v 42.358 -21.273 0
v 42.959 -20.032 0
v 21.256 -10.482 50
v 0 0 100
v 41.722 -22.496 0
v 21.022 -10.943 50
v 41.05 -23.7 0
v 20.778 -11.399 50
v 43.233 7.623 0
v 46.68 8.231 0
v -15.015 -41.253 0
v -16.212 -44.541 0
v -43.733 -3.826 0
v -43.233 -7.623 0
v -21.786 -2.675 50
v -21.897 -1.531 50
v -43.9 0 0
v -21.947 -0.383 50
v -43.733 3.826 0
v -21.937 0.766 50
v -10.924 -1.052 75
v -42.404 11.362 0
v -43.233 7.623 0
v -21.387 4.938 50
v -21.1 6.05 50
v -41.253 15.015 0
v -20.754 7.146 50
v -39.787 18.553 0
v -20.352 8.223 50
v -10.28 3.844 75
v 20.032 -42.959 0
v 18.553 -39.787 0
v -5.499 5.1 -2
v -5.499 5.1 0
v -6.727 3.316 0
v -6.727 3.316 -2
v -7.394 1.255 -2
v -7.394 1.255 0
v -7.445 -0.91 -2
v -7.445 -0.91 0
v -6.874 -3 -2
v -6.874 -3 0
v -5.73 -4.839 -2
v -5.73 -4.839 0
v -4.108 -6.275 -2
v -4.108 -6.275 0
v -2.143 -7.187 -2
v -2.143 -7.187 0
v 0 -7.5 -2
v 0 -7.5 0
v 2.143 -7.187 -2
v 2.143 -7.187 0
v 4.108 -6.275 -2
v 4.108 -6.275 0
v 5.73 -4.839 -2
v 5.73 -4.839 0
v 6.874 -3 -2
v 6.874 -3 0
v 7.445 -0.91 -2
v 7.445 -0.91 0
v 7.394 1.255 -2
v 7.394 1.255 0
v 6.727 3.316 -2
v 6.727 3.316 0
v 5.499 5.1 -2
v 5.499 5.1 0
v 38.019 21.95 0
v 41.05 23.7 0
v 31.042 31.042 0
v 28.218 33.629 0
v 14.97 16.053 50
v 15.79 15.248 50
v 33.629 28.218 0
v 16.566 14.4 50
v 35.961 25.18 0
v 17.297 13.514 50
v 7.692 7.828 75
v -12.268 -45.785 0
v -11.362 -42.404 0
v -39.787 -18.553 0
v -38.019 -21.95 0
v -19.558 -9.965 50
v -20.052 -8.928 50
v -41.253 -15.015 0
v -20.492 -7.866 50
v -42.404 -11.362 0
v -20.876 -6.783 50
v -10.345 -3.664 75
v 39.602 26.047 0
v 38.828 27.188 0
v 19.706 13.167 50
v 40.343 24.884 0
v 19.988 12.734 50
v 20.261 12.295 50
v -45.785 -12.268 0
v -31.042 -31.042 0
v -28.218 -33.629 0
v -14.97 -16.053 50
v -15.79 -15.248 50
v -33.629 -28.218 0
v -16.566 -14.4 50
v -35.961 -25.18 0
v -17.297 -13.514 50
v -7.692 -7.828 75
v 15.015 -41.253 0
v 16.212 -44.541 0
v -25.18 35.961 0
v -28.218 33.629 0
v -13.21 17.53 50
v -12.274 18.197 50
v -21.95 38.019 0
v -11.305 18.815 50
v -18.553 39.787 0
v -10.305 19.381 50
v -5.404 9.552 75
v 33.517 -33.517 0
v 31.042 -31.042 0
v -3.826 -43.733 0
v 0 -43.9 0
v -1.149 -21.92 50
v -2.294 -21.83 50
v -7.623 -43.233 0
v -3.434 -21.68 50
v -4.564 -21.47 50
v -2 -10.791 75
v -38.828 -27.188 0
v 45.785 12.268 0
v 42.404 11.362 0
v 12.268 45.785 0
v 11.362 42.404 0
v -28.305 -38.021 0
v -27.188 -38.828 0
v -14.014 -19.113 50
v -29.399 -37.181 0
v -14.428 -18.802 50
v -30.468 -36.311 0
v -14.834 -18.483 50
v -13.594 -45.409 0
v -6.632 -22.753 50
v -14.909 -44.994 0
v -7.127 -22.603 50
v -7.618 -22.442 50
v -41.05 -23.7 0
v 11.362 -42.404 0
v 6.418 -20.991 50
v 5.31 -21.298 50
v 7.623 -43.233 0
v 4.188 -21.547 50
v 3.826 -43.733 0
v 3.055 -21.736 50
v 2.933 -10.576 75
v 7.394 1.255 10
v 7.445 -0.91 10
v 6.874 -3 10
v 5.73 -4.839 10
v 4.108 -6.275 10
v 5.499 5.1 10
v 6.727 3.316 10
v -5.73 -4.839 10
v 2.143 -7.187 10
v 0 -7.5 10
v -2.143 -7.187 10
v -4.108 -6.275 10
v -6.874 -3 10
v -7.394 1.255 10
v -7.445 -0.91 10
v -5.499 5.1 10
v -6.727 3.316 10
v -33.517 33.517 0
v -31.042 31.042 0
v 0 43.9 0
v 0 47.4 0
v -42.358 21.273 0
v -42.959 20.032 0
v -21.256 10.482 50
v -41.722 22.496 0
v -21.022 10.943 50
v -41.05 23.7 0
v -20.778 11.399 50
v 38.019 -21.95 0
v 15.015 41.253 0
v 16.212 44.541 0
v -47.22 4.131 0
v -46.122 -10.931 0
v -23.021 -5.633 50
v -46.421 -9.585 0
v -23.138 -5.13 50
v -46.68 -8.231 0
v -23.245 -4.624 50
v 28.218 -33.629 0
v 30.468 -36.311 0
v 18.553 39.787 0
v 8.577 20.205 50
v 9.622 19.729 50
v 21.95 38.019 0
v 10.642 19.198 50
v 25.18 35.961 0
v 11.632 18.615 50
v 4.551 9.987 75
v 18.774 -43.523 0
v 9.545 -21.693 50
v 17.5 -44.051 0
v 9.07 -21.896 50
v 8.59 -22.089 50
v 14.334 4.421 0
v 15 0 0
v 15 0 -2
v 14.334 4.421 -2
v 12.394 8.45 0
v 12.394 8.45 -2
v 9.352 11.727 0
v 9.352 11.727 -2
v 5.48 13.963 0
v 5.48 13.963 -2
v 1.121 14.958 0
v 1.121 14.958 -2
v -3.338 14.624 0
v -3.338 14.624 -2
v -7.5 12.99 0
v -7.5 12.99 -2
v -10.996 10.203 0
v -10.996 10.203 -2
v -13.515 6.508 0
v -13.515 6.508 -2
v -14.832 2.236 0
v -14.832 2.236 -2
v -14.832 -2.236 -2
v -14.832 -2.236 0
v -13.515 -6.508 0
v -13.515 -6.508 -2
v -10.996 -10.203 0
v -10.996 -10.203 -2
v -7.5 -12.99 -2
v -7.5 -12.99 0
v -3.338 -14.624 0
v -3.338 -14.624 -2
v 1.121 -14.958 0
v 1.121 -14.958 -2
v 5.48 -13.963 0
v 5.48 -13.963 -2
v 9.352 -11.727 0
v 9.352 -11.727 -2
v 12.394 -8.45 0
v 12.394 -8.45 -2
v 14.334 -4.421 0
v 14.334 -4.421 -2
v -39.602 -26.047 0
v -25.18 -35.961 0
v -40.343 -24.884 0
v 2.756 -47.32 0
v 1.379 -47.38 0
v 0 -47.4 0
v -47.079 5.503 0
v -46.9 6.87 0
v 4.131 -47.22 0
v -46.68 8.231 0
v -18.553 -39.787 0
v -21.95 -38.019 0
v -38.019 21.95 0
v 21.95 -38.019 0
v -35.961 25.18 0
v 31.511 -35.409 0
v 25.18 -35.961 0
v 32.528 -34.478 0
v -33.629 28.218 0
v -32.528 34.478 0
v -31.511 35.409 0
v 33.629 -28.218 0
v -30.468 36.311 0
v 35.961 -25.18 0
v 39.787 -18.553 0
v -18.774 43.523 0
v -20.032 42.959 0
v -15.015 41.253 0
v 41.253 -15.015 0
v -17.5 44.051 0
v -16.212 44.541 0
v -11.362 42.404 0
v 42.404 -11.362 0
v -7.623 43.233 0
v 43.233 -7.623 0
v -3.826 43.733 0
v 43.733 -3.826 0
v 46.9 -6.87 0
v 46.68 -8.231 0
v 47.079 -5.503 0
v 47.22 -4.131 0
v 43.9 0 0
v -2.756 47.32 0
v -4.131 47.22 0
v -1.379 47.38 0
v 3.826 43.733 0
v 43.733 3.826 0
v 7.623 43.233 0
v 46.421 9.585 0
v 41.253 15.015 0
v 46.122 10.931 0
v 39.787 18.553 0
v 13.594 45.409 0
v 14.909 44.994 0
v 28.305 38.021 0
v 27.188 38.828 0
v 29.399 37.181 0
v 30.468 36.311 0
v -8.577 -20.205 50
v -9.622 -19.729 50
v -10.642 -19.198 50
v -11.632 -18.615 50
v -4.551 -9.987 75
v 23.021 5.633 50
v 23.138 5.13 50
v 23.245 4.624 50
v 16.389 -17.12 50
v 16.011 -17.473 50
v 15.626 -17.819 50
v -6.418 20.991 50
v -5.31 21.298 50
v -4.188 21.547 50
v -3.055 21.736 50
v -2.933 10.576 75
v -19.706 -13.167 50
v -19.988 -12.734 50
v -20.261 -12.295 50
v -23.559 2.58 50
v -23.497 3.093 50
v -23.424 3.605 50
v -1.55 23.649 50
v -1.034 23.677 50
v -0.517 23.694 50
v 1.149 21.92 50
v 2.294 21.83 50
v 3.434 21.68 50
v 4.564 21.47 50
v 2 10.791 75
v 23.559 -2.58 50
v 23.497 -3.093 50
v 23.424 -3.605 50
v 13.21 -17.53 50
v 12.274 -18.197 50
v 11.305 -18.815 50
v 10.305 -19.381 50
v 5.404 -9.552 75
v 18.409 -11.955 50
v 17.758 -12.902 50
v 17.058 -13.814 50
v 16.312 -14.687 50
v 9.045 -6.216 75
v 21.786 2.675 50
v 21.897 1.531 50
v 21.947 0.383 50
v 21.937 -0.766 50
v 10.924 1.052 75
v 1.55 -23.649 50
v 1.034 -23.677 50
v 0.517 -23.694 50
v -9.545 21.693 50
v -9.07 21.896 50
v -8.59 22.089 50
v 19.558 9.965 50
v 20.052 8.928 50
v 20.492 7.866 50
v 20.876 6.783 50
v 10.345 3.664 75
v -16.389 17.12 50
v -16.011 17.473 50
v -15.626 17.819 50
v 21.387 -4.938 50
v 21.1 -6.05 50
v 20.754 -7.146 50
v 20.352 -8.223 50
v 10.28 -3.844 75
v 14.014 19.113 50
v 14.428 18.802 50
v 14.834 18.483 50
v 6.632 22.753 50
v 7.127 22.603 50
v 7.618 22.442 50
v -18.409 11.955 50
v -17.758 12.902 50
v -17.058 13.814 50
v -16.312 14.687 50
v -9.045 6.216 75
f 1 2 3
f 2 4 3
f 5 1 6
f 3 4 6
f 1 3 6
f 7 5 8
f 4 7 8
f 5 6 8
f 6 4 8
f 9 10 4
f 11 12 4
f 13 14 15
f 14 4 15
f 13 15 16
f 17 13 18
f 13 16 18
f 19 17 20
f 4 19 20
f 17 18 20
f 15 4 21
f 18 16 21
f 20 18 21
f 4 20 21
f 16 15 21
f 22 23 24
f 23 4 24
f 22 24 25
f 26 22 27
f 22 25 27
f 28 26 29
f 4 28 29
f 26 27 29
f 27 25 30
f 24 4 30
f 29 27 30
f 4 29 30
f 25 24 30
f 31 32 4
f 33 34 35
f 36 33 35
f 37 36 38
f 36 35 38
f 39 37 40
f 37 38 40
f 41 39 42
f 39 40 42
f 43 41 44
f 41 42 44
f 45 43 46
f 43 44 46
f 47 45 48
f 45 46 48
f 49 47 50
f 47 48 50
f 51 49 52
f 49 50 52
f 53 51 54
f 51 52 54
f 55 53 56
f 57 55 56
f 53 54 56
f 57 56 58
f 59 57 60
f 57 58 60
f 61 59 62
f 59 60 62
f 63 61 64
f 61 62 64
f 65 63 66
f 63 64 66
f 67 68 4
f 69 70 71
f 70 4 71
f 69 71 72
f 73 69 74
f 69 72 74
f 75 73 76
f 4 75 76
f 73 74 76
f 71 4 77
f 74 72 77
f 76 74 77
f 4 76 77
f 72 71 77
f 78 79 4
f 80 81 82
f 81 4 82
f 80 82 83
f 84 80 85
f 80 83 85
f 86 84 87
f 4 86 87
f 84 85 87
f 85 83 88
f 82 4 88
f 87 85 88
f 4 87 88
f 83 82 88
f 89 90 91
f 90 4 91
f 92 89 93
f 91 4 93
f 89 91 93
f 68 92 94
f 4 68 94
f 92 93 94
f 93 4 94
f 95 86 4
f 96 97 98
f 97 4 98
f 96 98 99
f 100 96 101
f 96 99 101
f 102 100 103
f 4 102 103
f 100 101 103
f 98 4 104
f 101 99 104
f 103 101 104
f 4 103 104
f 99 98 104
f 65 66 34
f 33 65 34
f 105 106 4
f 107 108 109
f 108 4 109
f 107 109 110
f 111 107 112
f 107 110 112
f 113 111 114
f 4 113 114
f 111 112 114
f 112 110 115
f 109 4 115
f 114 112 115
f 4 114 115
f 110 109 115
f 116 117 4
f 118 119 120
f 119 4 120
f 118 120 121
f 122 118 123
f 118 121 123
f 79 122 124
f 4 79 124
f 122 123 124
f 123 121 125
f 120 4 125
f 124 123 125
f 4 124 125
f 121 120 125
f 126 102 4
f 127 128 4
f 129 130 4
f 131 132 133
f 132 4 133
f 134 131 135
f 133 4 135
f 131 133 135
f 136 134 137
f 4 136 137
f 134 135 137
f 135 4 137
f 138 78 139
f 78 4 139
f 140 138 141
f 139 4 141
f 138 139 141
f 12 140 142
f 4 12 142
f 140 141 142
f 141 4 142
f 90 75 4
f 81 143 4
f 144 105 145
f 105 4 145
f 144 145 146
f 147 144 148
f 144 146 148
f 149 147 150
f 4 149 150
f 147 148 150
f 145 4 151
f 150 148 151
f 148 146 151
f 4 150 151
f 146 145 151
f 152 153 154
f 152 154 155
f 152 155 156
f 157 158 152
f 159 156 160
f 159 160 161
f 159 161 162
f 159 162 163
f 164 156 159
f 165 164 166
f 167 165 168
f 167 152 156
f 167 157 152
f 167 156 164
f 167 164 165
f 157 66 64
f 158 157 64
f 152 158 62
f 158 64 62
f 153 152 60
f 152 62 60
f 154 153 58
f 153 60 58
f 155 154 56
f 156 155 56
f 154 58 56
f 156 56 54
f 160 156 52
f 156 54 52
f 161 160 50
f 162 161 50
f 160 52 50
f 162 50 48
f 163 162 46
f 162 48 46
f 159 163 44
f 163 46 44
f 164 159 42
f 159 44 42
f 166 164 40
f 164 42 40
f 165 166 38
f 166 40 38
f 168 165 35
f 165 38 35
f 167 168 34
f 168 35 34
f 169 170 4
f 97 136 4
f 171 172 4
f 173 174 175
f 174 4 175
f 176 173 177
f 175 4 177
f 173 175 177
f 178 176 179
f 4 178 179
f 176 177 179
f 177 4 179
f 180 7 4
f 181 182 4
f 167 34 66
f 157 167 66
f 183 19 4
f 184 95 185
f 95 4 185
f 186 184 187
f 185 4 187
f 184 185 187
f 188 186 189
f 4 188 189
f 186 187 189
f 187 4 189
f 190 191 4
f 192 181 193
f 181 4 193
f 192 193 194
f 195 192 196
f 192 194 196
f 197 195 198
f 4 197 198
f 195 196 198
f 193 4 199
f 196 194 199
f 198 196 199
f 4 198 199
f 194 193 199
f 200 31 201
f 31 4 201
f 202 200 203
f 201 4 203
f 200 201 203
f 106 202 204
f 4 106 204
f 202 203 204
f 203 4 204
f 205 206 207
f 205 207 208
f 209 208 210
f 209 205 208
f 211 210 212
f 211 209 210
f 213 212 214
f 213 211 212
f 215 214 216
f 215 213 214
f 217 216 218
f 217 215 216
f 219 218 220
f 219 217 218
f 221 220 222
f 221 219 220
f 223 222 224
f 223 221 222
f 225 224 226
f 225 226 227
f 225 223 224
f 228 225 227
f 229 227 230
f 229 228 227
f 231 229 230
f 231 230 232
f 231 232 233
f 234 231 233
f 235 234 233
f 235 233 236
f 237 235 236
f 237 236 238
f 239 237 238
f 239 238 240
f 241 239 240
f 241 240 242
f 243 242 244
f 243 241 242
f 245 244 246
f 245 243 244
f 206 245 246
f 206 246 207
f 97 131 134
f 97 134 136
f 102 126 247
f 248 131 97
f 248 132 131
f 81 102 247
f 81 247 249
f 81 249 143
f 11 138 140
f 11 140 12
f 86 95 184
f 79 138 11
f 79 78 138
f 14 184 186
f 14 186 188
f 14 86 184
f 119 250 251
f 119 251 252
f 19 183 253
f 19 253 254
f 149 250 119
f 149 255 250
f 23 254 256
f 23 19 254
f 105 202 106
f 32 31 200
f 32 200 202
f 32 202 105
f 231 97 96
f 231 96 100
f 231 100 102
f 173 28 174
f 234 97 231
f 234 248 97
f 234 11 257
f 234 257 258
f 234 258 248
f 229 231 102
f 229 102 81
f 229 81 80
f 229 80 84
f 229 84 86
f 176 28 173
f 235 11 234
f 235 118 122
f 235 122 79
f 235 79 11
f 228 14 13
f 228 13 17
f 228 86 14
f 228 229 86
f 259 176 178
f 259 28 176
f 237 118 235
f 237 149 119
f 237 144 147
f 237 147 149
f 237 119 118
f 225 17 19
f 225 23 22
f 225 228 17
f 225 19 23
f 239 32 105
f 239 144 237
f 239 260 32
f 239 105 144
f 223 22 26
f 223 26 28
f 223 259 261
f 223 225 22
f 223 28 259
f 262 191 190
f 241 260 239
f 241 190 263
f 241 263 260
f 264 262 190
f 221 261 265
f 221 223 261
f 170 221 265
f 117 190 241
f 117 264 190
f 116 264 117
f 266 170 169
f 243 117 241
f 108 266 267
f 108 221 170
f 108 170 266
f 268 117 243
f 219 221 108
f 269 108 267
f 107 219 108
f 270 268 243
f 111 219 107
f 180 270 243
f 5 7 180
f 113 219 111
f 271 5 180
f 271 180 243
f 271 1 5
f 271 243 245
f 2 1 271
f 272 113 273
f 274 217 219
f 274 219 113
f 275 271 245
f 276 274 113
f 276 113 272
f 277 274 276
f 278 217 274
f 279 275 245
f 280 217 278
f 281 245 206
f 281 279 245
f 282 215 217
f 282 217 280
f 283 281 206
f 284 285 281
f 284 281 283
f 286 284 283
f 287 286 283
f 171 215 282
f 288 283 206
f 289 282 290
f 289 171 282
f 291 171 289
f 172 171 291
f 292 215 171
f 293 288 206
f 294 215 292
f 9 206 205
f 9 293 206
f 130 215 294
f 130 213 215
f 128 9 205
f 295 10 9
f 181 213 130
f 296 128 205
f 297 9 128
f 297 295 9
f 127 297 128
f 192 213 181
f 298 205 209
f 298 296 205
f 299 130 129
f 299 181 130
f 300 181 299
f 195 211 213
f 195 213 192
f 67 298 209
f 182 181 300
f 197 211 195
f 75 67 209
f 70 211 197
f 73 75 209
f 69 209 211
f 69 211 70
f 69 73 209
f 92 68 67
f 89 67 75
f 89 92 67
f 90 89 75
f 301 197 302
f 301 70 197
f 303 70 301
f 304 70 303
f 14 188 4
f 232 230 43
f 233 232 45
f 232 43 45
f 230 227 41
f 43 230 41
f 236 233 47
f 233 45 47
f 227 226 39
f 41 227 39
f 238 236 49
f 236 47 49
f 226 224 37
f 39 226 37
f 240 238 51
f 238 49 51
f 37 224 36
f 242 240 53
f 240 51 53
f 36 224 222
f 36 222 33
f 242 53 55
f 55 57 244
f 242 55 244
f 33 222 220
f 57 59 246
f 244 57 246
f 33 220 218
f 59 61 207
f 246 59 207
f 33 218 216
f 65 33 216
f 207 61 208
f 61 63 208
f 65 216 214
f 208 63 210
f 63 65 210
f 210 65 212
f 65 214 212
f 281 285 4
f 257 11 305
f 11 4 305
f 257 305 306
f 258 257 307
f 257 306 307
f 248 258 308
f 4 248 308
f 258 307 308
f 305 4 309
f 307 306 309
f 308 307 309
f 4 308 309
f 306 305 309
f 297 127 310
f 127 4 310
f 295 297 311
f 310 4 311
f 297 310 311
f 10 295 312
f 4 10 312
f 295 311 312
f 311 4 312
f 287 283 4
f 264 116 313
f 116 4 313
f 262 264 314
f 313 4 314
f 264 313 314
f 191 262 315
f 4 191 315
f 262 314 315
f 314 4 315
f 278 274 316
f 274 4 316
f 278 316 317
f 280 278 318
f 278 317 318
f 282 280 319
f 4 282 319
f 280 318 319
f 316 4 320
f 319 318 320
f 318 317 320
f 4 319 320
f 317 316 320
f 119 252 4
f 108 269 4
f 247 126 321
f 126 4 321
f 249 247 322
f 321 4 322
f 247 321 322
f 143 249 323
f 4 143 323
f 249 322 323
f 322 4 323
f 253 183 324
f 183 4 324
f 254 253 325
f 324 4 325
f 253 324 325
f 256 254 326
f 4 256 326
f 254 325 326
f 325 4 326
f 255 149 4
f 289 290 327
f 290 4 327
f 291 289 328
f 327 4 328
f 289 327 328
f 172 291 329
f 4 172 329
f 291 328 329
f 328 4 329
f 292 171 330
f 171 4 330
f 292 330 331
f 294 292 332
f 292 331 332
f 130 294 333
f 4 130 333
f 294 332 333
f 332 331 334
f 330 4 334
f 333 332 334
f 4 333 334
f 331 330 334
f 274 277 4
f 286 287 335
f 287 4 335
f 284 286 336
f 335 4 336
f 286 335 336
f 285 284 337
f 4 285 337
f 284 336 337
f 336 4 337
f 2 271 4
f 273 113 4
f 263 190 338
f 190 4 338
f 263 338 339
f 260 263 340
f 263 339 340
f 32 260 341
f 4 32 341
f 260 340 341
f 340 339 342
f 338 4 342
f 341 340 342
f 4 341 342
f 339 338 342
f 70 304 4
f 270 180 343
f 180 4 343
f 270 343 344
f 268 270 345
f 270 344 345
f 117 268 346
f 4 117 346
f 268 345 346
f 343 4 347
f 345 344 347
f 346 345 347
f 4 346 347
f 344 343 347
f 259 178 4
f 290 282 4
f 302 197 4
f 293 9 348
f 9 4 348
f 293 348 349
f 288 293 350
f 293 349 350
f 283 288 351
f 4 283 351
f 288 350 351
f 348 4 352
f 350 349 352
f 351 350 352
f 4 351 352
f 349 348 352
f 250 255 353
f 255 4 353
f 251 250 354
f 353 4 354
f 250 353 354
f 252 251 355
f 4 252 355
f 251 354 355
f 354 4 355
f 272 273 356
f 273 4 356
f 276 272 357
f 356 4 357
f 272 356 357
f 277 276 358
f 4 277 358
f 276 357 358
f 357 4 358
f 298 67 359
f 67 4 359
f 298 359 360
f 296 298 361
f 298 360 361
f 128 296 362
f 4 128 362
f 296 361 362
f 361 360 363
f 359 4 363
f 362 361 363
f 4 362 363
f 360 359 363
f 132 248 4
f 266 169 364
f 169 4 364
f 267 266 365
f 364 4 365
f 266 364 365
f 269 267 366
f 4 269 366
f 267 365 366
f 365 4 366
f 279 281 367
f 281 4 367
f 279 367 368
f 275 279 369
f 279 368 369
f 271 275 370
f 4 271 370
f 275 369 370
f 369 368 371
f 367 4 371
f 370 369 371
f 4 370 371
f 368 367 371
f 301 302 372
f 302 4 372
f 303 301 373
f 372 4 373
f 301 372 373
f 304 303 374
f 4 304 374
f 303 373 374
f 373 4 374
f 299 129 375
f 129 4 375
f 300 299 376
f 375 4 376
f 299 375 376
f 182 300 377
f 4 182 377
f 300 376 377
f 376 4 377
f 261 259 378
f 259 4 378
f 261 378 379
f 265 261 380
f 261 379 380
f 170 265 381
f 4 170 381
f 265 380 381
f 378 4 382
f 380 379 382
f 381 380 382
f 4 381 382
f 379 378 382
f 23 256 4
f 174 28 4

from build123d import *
from build123d.topology import SkipClean

# Parameters (mm, degrees)
SKETCH1_R           = 15
BOSS_EXTRUDE1_DEPTH = 2
CUT_EXTRUDE1_START  = 10
CUT_EXTRUDE1_DEPTH  = 10


with BuildPart() as part:
    # Sketch1 → Boss-Extrude1 (new body)
    with BuildSketch(Plane.XY):
        Circle(SKETCH1_R)
        with BuildLine():
            ThreePointArc((5.499090834, 5.1), (0, -7.5), (-5.499090834, 5.1))
            Line((-5.499090834, 5.1), (5.499090834, 5.1))
        make_face(mode=Mode.SUBTRACT)
    extrude(amount=-BOSS_EXTRUDE1_DEPTH)

    # Sketch3 → Loft2 section 0
    with BuildSketch(Plane.XY, mode=Mode.PRIVATE) as loft2_s0:
        with BuildLine():
            Line((0, 47.4), (0, 43.9))
            ThreePointArc((0, 43.9), (5.730099838, 43.524429414), (11.36215608, 42.404143774))
            Line((11.36215608, 42.404143774), (12.268022738, 45.784884166))
            ThreePointArc((12.268022738, 45.784884166), (14.253454897, 45.206183465), (16.211754794, 44.541430225))
            Line((16.211754794, 44.541430225), (15.014684292, 41.252506053))
            ThreePointArc((15.014684292, 41.252506053), (20.270764121, 38.939775577), (25.180005556, 35.960774744))
            Line((25.180005556, 35.960774744), (27.187523083, 38.827806899))
            ThreePointArc((27.187523083, 38.827806899), (28.855291735, 37.60494833), (30.468132699, 36.310506604))
            Line((30.468132699, 36.310506604), (28.218376065, 33.629351053))
            ThreePointArc((28.218376065, 33.629351053), (32.366475086, 29.658410114), (35.960774744, 25.180005556))
            Line((35.960774744, 25.180005556), (38.827806899, 27.187523083))
            ThreePointArc((38.827806899, 27.187523083), (39.976754532, 25.468001436), (41.049604139, 23.7))
            Line((41.049604139, 23.7), (38.018515226, 21.95))
            ThreePointArc((38.018515226, 21.95), (40.558311477, 16.799802681), (42.404143774, 11.36215608))
            Line((42.404143774, 11.36215608), (45.784884166, 12.268022738))
            ThreePointArc((45.784884166, 12.268022738), (46.276430737, 10.259237701), (46.679887493, 8.230923621))
            Line((46.679887493, 8.230923621), (43.233060357, 7.623155))
            ThreePointArc((43.233060357, 7.623155), (43.858216927, 1.914891105), (43.732947246, -3.826137107))
            Line((43.732947246, -3.826137107), (47.21962869, -4.131182206))
            ThreePointArc((47.21962869, -4.131182206), (46.994486429, -6.186941511), (46.679887493, -8.230923621))
            Line((46.679887493, -8.230923621), (43.233060357, -7.623155))
            ThreePointArc((43.233060357, -7.623155), (41.868174138, -13.200984598), (39.786911851, -18.55294169))
            Line((39.786911851, -18.55294169), (42.958989106, -20.032105607))
            ThreePointArc((42.958989106, -20.032105607), (42.044313493, -21.886884267), (41.049604139, -23.7))
            Line((41.049604139, -23.7), (38.018515226, -21.95))
            ThreePointArc((38.018515226, -21.95), (34.828211639, -26.724626733), (31.041987694, -31.041987694))
            Line((31.041987694, -31.041987694), (33.516861428, -33.516861428))
            ThreePointArc((33.516861428, -33.516861428), (32.022975841, -34.946945765), (30.468132699, -36.310506604))
            Line((30.468132699, -36.310506604), (28.218376065, -33.629351053))
            ThreePointArc((28.218376065, -33.629351053), (23.587452806, -37.024884471), (18.55294169, -39.786911851))
            Line((18.55294169, -39.786911851), (20.032105607, -42.958989106))
            ThreePointArc((20.032105607, -42.958989106), (18.139194694, -43.791889841), (16.211754794, -44.541430225))
            Line((16.211754794, -44.541430225), (15.014684292, -41.252506053))
            ThreePointArc((15.014684292, -41.252506053), (9.501699052, -42.859394713), (3.826137107, -43.732947246))
            Line((3.826137107, -43.732947246), (4.131182206, -47.21962869))
            ThreePointArc((4.131182206, -47.21962869), (2.067558961, -47.354885703), (0, -47.4))
            Line((0, -47.4), (0, -43.9))
            ThreePointArc((0, -43.9), (-5.730099838, -43.524429414), (-11.36215608, -42.404143774))
            Line((-11.36215608, -42.404143774), (-12.268022738, -45.784884166))
            ThreePointArc((-12.268022738, -45.784884166), (-14.253454897, -45.206183465), (-16.211754794, -44.541430225))
            Line((-16.211754794, -44.541430225), (-15.014684292, -41.252506053))
            ThreePointArc((-15.014684292, -41.252506053), (-20.270764121, -38.939775577), (-25.180005556, -35.960774744))
            Line((-25.180005556, -35.960774744), (-27.187523083, -38.827806899))
            ThreePointArc((-27.187523083, -38.827806899), (-28.855291735, -37.60494833), (-30.468132699, -36.310506604))
            Line((-30.468132699, -36.310506604), (-28.218376065, -33.629351053))
            ThreePointArc((-28.218376065, -33.629351053), (-32.366475086, -29.658410114), (-35.960774744, -25.180005556))
            Line((-35.960774744, -25.180005556), (-38.827806899, -27.187523083))
            ThreePointArc((-38.827806899, -27.187523083), (-39.976754532, -25.468001436), (-41.049604139, -23.7))
            Line((-41.049604139, -23.7), (-38.018515226, -21.95))
            ThreePointArc((-38.018515226, -21.95), (-40.558311477, -16.799802681), (-42.404143774, -11.36215608))
            Line((-42.404143774, -11.36215608), (-45.784884166, -12.268022738))
            ThreePointArc((-45.784884166, -12.268022738), (-46.276430737, -10.259237701), (-46.679887493, -8.230923621))
            Line((-46.679887493, -8.230923621), (-43.233060357, -7.623155))
            ThreePointArc((-43.233060357, -7.623155), (-43.858216927, -1.914891105), (-43.732947246, 3.826137107))
            Line((-43.732947246, 3.826137107), (-47.21962869, 4.131182206))
            ThreePointArc((-47.21962869, 4.131182206), (-46.994486429, 6.186941511), (-46.679887493, 8.230923621))
            Line((-46.679887493, 8.230923621), (-43.233060357, 7.623155))
            ThreePointArc((-43.233060357, 7.623155), (-41.868174138, 13.200984598), (-39.786911851, 18.55294169))
            Line((-39.786911851, 18.55294169), (-42.958989106, 20.032105607))
            ThreePointArc((-42.958989106, 20.032105607), (-42.044313493, 21.886884267), (-41.049604139, 23.7))
            Line((-41.049604139, 23.7), (-38.018515226, 21.95))
            ThreePointArc((-38.018515226, 21.95), (-34.828211639, 26.724626733), (-31.041987694, 31.041987694))
            Line((-31.041987694, 31.041987694), (-33.516861428, 33.516861428))
            ThreePointArc((-33.516861428, 33.516861428), (-32.022975841, 34.946945765), (-30.468132699, 36.310506604))
            Line((-30.468132699, 36.310506604), (-28.218376065, 33.629351053))
            ThreePointArc((-28.218376065, 33.629351053), (-23.587452806, 37.024884471), (-18.55294169, 39.786911851))
            Line((-18.55294169, 39.786911851), (-20.032105607, 42.958989106))
            ThreePointArc((-20.032105607, 42.958989106), (-18.139194694, 43.791889841), (-16.211754794, 44.541430225))
            Line((-16.211754794, 44.541430225), (-15.014684292, 41.252506053))
            ThreePointArc((-15.014684292, 41.252506053), (-9.501699052, 42.859394713), (-3.826137107, 43.732947246))
            Line((-3.826137107, 43.732947246), (-4.131182206, 47.21962869))
            ThreePointArc((-4.131182206, 47.21962869), (-2.067558961, 47.354885703), (0, 47.4))
        make_face()
    loft([loft2_s0.sketch, Vertex(0, 0, 100)])

    # Sketch1<4> → Cut-Extrude1 (cut)
    with SkipClean():  # the faces are left unmerged after this step: merging them gives an invalid solid
        with BuildSketch(Plane.XY.offset(CUT_EXTRUDE1_START)):
            with BuildLine():
                Line((5.499090834, 5.1), (-5.499090834, 5.1))
                ThreePointArc((-5.499090834, 5.1), (0, -7.5), (5.499090834, 5.1))
            make_face()
        extrude(amount=-CUT_EXTRUDE1_DEPTH, mode=Mode.SUBTRACT)


solid = part.part
